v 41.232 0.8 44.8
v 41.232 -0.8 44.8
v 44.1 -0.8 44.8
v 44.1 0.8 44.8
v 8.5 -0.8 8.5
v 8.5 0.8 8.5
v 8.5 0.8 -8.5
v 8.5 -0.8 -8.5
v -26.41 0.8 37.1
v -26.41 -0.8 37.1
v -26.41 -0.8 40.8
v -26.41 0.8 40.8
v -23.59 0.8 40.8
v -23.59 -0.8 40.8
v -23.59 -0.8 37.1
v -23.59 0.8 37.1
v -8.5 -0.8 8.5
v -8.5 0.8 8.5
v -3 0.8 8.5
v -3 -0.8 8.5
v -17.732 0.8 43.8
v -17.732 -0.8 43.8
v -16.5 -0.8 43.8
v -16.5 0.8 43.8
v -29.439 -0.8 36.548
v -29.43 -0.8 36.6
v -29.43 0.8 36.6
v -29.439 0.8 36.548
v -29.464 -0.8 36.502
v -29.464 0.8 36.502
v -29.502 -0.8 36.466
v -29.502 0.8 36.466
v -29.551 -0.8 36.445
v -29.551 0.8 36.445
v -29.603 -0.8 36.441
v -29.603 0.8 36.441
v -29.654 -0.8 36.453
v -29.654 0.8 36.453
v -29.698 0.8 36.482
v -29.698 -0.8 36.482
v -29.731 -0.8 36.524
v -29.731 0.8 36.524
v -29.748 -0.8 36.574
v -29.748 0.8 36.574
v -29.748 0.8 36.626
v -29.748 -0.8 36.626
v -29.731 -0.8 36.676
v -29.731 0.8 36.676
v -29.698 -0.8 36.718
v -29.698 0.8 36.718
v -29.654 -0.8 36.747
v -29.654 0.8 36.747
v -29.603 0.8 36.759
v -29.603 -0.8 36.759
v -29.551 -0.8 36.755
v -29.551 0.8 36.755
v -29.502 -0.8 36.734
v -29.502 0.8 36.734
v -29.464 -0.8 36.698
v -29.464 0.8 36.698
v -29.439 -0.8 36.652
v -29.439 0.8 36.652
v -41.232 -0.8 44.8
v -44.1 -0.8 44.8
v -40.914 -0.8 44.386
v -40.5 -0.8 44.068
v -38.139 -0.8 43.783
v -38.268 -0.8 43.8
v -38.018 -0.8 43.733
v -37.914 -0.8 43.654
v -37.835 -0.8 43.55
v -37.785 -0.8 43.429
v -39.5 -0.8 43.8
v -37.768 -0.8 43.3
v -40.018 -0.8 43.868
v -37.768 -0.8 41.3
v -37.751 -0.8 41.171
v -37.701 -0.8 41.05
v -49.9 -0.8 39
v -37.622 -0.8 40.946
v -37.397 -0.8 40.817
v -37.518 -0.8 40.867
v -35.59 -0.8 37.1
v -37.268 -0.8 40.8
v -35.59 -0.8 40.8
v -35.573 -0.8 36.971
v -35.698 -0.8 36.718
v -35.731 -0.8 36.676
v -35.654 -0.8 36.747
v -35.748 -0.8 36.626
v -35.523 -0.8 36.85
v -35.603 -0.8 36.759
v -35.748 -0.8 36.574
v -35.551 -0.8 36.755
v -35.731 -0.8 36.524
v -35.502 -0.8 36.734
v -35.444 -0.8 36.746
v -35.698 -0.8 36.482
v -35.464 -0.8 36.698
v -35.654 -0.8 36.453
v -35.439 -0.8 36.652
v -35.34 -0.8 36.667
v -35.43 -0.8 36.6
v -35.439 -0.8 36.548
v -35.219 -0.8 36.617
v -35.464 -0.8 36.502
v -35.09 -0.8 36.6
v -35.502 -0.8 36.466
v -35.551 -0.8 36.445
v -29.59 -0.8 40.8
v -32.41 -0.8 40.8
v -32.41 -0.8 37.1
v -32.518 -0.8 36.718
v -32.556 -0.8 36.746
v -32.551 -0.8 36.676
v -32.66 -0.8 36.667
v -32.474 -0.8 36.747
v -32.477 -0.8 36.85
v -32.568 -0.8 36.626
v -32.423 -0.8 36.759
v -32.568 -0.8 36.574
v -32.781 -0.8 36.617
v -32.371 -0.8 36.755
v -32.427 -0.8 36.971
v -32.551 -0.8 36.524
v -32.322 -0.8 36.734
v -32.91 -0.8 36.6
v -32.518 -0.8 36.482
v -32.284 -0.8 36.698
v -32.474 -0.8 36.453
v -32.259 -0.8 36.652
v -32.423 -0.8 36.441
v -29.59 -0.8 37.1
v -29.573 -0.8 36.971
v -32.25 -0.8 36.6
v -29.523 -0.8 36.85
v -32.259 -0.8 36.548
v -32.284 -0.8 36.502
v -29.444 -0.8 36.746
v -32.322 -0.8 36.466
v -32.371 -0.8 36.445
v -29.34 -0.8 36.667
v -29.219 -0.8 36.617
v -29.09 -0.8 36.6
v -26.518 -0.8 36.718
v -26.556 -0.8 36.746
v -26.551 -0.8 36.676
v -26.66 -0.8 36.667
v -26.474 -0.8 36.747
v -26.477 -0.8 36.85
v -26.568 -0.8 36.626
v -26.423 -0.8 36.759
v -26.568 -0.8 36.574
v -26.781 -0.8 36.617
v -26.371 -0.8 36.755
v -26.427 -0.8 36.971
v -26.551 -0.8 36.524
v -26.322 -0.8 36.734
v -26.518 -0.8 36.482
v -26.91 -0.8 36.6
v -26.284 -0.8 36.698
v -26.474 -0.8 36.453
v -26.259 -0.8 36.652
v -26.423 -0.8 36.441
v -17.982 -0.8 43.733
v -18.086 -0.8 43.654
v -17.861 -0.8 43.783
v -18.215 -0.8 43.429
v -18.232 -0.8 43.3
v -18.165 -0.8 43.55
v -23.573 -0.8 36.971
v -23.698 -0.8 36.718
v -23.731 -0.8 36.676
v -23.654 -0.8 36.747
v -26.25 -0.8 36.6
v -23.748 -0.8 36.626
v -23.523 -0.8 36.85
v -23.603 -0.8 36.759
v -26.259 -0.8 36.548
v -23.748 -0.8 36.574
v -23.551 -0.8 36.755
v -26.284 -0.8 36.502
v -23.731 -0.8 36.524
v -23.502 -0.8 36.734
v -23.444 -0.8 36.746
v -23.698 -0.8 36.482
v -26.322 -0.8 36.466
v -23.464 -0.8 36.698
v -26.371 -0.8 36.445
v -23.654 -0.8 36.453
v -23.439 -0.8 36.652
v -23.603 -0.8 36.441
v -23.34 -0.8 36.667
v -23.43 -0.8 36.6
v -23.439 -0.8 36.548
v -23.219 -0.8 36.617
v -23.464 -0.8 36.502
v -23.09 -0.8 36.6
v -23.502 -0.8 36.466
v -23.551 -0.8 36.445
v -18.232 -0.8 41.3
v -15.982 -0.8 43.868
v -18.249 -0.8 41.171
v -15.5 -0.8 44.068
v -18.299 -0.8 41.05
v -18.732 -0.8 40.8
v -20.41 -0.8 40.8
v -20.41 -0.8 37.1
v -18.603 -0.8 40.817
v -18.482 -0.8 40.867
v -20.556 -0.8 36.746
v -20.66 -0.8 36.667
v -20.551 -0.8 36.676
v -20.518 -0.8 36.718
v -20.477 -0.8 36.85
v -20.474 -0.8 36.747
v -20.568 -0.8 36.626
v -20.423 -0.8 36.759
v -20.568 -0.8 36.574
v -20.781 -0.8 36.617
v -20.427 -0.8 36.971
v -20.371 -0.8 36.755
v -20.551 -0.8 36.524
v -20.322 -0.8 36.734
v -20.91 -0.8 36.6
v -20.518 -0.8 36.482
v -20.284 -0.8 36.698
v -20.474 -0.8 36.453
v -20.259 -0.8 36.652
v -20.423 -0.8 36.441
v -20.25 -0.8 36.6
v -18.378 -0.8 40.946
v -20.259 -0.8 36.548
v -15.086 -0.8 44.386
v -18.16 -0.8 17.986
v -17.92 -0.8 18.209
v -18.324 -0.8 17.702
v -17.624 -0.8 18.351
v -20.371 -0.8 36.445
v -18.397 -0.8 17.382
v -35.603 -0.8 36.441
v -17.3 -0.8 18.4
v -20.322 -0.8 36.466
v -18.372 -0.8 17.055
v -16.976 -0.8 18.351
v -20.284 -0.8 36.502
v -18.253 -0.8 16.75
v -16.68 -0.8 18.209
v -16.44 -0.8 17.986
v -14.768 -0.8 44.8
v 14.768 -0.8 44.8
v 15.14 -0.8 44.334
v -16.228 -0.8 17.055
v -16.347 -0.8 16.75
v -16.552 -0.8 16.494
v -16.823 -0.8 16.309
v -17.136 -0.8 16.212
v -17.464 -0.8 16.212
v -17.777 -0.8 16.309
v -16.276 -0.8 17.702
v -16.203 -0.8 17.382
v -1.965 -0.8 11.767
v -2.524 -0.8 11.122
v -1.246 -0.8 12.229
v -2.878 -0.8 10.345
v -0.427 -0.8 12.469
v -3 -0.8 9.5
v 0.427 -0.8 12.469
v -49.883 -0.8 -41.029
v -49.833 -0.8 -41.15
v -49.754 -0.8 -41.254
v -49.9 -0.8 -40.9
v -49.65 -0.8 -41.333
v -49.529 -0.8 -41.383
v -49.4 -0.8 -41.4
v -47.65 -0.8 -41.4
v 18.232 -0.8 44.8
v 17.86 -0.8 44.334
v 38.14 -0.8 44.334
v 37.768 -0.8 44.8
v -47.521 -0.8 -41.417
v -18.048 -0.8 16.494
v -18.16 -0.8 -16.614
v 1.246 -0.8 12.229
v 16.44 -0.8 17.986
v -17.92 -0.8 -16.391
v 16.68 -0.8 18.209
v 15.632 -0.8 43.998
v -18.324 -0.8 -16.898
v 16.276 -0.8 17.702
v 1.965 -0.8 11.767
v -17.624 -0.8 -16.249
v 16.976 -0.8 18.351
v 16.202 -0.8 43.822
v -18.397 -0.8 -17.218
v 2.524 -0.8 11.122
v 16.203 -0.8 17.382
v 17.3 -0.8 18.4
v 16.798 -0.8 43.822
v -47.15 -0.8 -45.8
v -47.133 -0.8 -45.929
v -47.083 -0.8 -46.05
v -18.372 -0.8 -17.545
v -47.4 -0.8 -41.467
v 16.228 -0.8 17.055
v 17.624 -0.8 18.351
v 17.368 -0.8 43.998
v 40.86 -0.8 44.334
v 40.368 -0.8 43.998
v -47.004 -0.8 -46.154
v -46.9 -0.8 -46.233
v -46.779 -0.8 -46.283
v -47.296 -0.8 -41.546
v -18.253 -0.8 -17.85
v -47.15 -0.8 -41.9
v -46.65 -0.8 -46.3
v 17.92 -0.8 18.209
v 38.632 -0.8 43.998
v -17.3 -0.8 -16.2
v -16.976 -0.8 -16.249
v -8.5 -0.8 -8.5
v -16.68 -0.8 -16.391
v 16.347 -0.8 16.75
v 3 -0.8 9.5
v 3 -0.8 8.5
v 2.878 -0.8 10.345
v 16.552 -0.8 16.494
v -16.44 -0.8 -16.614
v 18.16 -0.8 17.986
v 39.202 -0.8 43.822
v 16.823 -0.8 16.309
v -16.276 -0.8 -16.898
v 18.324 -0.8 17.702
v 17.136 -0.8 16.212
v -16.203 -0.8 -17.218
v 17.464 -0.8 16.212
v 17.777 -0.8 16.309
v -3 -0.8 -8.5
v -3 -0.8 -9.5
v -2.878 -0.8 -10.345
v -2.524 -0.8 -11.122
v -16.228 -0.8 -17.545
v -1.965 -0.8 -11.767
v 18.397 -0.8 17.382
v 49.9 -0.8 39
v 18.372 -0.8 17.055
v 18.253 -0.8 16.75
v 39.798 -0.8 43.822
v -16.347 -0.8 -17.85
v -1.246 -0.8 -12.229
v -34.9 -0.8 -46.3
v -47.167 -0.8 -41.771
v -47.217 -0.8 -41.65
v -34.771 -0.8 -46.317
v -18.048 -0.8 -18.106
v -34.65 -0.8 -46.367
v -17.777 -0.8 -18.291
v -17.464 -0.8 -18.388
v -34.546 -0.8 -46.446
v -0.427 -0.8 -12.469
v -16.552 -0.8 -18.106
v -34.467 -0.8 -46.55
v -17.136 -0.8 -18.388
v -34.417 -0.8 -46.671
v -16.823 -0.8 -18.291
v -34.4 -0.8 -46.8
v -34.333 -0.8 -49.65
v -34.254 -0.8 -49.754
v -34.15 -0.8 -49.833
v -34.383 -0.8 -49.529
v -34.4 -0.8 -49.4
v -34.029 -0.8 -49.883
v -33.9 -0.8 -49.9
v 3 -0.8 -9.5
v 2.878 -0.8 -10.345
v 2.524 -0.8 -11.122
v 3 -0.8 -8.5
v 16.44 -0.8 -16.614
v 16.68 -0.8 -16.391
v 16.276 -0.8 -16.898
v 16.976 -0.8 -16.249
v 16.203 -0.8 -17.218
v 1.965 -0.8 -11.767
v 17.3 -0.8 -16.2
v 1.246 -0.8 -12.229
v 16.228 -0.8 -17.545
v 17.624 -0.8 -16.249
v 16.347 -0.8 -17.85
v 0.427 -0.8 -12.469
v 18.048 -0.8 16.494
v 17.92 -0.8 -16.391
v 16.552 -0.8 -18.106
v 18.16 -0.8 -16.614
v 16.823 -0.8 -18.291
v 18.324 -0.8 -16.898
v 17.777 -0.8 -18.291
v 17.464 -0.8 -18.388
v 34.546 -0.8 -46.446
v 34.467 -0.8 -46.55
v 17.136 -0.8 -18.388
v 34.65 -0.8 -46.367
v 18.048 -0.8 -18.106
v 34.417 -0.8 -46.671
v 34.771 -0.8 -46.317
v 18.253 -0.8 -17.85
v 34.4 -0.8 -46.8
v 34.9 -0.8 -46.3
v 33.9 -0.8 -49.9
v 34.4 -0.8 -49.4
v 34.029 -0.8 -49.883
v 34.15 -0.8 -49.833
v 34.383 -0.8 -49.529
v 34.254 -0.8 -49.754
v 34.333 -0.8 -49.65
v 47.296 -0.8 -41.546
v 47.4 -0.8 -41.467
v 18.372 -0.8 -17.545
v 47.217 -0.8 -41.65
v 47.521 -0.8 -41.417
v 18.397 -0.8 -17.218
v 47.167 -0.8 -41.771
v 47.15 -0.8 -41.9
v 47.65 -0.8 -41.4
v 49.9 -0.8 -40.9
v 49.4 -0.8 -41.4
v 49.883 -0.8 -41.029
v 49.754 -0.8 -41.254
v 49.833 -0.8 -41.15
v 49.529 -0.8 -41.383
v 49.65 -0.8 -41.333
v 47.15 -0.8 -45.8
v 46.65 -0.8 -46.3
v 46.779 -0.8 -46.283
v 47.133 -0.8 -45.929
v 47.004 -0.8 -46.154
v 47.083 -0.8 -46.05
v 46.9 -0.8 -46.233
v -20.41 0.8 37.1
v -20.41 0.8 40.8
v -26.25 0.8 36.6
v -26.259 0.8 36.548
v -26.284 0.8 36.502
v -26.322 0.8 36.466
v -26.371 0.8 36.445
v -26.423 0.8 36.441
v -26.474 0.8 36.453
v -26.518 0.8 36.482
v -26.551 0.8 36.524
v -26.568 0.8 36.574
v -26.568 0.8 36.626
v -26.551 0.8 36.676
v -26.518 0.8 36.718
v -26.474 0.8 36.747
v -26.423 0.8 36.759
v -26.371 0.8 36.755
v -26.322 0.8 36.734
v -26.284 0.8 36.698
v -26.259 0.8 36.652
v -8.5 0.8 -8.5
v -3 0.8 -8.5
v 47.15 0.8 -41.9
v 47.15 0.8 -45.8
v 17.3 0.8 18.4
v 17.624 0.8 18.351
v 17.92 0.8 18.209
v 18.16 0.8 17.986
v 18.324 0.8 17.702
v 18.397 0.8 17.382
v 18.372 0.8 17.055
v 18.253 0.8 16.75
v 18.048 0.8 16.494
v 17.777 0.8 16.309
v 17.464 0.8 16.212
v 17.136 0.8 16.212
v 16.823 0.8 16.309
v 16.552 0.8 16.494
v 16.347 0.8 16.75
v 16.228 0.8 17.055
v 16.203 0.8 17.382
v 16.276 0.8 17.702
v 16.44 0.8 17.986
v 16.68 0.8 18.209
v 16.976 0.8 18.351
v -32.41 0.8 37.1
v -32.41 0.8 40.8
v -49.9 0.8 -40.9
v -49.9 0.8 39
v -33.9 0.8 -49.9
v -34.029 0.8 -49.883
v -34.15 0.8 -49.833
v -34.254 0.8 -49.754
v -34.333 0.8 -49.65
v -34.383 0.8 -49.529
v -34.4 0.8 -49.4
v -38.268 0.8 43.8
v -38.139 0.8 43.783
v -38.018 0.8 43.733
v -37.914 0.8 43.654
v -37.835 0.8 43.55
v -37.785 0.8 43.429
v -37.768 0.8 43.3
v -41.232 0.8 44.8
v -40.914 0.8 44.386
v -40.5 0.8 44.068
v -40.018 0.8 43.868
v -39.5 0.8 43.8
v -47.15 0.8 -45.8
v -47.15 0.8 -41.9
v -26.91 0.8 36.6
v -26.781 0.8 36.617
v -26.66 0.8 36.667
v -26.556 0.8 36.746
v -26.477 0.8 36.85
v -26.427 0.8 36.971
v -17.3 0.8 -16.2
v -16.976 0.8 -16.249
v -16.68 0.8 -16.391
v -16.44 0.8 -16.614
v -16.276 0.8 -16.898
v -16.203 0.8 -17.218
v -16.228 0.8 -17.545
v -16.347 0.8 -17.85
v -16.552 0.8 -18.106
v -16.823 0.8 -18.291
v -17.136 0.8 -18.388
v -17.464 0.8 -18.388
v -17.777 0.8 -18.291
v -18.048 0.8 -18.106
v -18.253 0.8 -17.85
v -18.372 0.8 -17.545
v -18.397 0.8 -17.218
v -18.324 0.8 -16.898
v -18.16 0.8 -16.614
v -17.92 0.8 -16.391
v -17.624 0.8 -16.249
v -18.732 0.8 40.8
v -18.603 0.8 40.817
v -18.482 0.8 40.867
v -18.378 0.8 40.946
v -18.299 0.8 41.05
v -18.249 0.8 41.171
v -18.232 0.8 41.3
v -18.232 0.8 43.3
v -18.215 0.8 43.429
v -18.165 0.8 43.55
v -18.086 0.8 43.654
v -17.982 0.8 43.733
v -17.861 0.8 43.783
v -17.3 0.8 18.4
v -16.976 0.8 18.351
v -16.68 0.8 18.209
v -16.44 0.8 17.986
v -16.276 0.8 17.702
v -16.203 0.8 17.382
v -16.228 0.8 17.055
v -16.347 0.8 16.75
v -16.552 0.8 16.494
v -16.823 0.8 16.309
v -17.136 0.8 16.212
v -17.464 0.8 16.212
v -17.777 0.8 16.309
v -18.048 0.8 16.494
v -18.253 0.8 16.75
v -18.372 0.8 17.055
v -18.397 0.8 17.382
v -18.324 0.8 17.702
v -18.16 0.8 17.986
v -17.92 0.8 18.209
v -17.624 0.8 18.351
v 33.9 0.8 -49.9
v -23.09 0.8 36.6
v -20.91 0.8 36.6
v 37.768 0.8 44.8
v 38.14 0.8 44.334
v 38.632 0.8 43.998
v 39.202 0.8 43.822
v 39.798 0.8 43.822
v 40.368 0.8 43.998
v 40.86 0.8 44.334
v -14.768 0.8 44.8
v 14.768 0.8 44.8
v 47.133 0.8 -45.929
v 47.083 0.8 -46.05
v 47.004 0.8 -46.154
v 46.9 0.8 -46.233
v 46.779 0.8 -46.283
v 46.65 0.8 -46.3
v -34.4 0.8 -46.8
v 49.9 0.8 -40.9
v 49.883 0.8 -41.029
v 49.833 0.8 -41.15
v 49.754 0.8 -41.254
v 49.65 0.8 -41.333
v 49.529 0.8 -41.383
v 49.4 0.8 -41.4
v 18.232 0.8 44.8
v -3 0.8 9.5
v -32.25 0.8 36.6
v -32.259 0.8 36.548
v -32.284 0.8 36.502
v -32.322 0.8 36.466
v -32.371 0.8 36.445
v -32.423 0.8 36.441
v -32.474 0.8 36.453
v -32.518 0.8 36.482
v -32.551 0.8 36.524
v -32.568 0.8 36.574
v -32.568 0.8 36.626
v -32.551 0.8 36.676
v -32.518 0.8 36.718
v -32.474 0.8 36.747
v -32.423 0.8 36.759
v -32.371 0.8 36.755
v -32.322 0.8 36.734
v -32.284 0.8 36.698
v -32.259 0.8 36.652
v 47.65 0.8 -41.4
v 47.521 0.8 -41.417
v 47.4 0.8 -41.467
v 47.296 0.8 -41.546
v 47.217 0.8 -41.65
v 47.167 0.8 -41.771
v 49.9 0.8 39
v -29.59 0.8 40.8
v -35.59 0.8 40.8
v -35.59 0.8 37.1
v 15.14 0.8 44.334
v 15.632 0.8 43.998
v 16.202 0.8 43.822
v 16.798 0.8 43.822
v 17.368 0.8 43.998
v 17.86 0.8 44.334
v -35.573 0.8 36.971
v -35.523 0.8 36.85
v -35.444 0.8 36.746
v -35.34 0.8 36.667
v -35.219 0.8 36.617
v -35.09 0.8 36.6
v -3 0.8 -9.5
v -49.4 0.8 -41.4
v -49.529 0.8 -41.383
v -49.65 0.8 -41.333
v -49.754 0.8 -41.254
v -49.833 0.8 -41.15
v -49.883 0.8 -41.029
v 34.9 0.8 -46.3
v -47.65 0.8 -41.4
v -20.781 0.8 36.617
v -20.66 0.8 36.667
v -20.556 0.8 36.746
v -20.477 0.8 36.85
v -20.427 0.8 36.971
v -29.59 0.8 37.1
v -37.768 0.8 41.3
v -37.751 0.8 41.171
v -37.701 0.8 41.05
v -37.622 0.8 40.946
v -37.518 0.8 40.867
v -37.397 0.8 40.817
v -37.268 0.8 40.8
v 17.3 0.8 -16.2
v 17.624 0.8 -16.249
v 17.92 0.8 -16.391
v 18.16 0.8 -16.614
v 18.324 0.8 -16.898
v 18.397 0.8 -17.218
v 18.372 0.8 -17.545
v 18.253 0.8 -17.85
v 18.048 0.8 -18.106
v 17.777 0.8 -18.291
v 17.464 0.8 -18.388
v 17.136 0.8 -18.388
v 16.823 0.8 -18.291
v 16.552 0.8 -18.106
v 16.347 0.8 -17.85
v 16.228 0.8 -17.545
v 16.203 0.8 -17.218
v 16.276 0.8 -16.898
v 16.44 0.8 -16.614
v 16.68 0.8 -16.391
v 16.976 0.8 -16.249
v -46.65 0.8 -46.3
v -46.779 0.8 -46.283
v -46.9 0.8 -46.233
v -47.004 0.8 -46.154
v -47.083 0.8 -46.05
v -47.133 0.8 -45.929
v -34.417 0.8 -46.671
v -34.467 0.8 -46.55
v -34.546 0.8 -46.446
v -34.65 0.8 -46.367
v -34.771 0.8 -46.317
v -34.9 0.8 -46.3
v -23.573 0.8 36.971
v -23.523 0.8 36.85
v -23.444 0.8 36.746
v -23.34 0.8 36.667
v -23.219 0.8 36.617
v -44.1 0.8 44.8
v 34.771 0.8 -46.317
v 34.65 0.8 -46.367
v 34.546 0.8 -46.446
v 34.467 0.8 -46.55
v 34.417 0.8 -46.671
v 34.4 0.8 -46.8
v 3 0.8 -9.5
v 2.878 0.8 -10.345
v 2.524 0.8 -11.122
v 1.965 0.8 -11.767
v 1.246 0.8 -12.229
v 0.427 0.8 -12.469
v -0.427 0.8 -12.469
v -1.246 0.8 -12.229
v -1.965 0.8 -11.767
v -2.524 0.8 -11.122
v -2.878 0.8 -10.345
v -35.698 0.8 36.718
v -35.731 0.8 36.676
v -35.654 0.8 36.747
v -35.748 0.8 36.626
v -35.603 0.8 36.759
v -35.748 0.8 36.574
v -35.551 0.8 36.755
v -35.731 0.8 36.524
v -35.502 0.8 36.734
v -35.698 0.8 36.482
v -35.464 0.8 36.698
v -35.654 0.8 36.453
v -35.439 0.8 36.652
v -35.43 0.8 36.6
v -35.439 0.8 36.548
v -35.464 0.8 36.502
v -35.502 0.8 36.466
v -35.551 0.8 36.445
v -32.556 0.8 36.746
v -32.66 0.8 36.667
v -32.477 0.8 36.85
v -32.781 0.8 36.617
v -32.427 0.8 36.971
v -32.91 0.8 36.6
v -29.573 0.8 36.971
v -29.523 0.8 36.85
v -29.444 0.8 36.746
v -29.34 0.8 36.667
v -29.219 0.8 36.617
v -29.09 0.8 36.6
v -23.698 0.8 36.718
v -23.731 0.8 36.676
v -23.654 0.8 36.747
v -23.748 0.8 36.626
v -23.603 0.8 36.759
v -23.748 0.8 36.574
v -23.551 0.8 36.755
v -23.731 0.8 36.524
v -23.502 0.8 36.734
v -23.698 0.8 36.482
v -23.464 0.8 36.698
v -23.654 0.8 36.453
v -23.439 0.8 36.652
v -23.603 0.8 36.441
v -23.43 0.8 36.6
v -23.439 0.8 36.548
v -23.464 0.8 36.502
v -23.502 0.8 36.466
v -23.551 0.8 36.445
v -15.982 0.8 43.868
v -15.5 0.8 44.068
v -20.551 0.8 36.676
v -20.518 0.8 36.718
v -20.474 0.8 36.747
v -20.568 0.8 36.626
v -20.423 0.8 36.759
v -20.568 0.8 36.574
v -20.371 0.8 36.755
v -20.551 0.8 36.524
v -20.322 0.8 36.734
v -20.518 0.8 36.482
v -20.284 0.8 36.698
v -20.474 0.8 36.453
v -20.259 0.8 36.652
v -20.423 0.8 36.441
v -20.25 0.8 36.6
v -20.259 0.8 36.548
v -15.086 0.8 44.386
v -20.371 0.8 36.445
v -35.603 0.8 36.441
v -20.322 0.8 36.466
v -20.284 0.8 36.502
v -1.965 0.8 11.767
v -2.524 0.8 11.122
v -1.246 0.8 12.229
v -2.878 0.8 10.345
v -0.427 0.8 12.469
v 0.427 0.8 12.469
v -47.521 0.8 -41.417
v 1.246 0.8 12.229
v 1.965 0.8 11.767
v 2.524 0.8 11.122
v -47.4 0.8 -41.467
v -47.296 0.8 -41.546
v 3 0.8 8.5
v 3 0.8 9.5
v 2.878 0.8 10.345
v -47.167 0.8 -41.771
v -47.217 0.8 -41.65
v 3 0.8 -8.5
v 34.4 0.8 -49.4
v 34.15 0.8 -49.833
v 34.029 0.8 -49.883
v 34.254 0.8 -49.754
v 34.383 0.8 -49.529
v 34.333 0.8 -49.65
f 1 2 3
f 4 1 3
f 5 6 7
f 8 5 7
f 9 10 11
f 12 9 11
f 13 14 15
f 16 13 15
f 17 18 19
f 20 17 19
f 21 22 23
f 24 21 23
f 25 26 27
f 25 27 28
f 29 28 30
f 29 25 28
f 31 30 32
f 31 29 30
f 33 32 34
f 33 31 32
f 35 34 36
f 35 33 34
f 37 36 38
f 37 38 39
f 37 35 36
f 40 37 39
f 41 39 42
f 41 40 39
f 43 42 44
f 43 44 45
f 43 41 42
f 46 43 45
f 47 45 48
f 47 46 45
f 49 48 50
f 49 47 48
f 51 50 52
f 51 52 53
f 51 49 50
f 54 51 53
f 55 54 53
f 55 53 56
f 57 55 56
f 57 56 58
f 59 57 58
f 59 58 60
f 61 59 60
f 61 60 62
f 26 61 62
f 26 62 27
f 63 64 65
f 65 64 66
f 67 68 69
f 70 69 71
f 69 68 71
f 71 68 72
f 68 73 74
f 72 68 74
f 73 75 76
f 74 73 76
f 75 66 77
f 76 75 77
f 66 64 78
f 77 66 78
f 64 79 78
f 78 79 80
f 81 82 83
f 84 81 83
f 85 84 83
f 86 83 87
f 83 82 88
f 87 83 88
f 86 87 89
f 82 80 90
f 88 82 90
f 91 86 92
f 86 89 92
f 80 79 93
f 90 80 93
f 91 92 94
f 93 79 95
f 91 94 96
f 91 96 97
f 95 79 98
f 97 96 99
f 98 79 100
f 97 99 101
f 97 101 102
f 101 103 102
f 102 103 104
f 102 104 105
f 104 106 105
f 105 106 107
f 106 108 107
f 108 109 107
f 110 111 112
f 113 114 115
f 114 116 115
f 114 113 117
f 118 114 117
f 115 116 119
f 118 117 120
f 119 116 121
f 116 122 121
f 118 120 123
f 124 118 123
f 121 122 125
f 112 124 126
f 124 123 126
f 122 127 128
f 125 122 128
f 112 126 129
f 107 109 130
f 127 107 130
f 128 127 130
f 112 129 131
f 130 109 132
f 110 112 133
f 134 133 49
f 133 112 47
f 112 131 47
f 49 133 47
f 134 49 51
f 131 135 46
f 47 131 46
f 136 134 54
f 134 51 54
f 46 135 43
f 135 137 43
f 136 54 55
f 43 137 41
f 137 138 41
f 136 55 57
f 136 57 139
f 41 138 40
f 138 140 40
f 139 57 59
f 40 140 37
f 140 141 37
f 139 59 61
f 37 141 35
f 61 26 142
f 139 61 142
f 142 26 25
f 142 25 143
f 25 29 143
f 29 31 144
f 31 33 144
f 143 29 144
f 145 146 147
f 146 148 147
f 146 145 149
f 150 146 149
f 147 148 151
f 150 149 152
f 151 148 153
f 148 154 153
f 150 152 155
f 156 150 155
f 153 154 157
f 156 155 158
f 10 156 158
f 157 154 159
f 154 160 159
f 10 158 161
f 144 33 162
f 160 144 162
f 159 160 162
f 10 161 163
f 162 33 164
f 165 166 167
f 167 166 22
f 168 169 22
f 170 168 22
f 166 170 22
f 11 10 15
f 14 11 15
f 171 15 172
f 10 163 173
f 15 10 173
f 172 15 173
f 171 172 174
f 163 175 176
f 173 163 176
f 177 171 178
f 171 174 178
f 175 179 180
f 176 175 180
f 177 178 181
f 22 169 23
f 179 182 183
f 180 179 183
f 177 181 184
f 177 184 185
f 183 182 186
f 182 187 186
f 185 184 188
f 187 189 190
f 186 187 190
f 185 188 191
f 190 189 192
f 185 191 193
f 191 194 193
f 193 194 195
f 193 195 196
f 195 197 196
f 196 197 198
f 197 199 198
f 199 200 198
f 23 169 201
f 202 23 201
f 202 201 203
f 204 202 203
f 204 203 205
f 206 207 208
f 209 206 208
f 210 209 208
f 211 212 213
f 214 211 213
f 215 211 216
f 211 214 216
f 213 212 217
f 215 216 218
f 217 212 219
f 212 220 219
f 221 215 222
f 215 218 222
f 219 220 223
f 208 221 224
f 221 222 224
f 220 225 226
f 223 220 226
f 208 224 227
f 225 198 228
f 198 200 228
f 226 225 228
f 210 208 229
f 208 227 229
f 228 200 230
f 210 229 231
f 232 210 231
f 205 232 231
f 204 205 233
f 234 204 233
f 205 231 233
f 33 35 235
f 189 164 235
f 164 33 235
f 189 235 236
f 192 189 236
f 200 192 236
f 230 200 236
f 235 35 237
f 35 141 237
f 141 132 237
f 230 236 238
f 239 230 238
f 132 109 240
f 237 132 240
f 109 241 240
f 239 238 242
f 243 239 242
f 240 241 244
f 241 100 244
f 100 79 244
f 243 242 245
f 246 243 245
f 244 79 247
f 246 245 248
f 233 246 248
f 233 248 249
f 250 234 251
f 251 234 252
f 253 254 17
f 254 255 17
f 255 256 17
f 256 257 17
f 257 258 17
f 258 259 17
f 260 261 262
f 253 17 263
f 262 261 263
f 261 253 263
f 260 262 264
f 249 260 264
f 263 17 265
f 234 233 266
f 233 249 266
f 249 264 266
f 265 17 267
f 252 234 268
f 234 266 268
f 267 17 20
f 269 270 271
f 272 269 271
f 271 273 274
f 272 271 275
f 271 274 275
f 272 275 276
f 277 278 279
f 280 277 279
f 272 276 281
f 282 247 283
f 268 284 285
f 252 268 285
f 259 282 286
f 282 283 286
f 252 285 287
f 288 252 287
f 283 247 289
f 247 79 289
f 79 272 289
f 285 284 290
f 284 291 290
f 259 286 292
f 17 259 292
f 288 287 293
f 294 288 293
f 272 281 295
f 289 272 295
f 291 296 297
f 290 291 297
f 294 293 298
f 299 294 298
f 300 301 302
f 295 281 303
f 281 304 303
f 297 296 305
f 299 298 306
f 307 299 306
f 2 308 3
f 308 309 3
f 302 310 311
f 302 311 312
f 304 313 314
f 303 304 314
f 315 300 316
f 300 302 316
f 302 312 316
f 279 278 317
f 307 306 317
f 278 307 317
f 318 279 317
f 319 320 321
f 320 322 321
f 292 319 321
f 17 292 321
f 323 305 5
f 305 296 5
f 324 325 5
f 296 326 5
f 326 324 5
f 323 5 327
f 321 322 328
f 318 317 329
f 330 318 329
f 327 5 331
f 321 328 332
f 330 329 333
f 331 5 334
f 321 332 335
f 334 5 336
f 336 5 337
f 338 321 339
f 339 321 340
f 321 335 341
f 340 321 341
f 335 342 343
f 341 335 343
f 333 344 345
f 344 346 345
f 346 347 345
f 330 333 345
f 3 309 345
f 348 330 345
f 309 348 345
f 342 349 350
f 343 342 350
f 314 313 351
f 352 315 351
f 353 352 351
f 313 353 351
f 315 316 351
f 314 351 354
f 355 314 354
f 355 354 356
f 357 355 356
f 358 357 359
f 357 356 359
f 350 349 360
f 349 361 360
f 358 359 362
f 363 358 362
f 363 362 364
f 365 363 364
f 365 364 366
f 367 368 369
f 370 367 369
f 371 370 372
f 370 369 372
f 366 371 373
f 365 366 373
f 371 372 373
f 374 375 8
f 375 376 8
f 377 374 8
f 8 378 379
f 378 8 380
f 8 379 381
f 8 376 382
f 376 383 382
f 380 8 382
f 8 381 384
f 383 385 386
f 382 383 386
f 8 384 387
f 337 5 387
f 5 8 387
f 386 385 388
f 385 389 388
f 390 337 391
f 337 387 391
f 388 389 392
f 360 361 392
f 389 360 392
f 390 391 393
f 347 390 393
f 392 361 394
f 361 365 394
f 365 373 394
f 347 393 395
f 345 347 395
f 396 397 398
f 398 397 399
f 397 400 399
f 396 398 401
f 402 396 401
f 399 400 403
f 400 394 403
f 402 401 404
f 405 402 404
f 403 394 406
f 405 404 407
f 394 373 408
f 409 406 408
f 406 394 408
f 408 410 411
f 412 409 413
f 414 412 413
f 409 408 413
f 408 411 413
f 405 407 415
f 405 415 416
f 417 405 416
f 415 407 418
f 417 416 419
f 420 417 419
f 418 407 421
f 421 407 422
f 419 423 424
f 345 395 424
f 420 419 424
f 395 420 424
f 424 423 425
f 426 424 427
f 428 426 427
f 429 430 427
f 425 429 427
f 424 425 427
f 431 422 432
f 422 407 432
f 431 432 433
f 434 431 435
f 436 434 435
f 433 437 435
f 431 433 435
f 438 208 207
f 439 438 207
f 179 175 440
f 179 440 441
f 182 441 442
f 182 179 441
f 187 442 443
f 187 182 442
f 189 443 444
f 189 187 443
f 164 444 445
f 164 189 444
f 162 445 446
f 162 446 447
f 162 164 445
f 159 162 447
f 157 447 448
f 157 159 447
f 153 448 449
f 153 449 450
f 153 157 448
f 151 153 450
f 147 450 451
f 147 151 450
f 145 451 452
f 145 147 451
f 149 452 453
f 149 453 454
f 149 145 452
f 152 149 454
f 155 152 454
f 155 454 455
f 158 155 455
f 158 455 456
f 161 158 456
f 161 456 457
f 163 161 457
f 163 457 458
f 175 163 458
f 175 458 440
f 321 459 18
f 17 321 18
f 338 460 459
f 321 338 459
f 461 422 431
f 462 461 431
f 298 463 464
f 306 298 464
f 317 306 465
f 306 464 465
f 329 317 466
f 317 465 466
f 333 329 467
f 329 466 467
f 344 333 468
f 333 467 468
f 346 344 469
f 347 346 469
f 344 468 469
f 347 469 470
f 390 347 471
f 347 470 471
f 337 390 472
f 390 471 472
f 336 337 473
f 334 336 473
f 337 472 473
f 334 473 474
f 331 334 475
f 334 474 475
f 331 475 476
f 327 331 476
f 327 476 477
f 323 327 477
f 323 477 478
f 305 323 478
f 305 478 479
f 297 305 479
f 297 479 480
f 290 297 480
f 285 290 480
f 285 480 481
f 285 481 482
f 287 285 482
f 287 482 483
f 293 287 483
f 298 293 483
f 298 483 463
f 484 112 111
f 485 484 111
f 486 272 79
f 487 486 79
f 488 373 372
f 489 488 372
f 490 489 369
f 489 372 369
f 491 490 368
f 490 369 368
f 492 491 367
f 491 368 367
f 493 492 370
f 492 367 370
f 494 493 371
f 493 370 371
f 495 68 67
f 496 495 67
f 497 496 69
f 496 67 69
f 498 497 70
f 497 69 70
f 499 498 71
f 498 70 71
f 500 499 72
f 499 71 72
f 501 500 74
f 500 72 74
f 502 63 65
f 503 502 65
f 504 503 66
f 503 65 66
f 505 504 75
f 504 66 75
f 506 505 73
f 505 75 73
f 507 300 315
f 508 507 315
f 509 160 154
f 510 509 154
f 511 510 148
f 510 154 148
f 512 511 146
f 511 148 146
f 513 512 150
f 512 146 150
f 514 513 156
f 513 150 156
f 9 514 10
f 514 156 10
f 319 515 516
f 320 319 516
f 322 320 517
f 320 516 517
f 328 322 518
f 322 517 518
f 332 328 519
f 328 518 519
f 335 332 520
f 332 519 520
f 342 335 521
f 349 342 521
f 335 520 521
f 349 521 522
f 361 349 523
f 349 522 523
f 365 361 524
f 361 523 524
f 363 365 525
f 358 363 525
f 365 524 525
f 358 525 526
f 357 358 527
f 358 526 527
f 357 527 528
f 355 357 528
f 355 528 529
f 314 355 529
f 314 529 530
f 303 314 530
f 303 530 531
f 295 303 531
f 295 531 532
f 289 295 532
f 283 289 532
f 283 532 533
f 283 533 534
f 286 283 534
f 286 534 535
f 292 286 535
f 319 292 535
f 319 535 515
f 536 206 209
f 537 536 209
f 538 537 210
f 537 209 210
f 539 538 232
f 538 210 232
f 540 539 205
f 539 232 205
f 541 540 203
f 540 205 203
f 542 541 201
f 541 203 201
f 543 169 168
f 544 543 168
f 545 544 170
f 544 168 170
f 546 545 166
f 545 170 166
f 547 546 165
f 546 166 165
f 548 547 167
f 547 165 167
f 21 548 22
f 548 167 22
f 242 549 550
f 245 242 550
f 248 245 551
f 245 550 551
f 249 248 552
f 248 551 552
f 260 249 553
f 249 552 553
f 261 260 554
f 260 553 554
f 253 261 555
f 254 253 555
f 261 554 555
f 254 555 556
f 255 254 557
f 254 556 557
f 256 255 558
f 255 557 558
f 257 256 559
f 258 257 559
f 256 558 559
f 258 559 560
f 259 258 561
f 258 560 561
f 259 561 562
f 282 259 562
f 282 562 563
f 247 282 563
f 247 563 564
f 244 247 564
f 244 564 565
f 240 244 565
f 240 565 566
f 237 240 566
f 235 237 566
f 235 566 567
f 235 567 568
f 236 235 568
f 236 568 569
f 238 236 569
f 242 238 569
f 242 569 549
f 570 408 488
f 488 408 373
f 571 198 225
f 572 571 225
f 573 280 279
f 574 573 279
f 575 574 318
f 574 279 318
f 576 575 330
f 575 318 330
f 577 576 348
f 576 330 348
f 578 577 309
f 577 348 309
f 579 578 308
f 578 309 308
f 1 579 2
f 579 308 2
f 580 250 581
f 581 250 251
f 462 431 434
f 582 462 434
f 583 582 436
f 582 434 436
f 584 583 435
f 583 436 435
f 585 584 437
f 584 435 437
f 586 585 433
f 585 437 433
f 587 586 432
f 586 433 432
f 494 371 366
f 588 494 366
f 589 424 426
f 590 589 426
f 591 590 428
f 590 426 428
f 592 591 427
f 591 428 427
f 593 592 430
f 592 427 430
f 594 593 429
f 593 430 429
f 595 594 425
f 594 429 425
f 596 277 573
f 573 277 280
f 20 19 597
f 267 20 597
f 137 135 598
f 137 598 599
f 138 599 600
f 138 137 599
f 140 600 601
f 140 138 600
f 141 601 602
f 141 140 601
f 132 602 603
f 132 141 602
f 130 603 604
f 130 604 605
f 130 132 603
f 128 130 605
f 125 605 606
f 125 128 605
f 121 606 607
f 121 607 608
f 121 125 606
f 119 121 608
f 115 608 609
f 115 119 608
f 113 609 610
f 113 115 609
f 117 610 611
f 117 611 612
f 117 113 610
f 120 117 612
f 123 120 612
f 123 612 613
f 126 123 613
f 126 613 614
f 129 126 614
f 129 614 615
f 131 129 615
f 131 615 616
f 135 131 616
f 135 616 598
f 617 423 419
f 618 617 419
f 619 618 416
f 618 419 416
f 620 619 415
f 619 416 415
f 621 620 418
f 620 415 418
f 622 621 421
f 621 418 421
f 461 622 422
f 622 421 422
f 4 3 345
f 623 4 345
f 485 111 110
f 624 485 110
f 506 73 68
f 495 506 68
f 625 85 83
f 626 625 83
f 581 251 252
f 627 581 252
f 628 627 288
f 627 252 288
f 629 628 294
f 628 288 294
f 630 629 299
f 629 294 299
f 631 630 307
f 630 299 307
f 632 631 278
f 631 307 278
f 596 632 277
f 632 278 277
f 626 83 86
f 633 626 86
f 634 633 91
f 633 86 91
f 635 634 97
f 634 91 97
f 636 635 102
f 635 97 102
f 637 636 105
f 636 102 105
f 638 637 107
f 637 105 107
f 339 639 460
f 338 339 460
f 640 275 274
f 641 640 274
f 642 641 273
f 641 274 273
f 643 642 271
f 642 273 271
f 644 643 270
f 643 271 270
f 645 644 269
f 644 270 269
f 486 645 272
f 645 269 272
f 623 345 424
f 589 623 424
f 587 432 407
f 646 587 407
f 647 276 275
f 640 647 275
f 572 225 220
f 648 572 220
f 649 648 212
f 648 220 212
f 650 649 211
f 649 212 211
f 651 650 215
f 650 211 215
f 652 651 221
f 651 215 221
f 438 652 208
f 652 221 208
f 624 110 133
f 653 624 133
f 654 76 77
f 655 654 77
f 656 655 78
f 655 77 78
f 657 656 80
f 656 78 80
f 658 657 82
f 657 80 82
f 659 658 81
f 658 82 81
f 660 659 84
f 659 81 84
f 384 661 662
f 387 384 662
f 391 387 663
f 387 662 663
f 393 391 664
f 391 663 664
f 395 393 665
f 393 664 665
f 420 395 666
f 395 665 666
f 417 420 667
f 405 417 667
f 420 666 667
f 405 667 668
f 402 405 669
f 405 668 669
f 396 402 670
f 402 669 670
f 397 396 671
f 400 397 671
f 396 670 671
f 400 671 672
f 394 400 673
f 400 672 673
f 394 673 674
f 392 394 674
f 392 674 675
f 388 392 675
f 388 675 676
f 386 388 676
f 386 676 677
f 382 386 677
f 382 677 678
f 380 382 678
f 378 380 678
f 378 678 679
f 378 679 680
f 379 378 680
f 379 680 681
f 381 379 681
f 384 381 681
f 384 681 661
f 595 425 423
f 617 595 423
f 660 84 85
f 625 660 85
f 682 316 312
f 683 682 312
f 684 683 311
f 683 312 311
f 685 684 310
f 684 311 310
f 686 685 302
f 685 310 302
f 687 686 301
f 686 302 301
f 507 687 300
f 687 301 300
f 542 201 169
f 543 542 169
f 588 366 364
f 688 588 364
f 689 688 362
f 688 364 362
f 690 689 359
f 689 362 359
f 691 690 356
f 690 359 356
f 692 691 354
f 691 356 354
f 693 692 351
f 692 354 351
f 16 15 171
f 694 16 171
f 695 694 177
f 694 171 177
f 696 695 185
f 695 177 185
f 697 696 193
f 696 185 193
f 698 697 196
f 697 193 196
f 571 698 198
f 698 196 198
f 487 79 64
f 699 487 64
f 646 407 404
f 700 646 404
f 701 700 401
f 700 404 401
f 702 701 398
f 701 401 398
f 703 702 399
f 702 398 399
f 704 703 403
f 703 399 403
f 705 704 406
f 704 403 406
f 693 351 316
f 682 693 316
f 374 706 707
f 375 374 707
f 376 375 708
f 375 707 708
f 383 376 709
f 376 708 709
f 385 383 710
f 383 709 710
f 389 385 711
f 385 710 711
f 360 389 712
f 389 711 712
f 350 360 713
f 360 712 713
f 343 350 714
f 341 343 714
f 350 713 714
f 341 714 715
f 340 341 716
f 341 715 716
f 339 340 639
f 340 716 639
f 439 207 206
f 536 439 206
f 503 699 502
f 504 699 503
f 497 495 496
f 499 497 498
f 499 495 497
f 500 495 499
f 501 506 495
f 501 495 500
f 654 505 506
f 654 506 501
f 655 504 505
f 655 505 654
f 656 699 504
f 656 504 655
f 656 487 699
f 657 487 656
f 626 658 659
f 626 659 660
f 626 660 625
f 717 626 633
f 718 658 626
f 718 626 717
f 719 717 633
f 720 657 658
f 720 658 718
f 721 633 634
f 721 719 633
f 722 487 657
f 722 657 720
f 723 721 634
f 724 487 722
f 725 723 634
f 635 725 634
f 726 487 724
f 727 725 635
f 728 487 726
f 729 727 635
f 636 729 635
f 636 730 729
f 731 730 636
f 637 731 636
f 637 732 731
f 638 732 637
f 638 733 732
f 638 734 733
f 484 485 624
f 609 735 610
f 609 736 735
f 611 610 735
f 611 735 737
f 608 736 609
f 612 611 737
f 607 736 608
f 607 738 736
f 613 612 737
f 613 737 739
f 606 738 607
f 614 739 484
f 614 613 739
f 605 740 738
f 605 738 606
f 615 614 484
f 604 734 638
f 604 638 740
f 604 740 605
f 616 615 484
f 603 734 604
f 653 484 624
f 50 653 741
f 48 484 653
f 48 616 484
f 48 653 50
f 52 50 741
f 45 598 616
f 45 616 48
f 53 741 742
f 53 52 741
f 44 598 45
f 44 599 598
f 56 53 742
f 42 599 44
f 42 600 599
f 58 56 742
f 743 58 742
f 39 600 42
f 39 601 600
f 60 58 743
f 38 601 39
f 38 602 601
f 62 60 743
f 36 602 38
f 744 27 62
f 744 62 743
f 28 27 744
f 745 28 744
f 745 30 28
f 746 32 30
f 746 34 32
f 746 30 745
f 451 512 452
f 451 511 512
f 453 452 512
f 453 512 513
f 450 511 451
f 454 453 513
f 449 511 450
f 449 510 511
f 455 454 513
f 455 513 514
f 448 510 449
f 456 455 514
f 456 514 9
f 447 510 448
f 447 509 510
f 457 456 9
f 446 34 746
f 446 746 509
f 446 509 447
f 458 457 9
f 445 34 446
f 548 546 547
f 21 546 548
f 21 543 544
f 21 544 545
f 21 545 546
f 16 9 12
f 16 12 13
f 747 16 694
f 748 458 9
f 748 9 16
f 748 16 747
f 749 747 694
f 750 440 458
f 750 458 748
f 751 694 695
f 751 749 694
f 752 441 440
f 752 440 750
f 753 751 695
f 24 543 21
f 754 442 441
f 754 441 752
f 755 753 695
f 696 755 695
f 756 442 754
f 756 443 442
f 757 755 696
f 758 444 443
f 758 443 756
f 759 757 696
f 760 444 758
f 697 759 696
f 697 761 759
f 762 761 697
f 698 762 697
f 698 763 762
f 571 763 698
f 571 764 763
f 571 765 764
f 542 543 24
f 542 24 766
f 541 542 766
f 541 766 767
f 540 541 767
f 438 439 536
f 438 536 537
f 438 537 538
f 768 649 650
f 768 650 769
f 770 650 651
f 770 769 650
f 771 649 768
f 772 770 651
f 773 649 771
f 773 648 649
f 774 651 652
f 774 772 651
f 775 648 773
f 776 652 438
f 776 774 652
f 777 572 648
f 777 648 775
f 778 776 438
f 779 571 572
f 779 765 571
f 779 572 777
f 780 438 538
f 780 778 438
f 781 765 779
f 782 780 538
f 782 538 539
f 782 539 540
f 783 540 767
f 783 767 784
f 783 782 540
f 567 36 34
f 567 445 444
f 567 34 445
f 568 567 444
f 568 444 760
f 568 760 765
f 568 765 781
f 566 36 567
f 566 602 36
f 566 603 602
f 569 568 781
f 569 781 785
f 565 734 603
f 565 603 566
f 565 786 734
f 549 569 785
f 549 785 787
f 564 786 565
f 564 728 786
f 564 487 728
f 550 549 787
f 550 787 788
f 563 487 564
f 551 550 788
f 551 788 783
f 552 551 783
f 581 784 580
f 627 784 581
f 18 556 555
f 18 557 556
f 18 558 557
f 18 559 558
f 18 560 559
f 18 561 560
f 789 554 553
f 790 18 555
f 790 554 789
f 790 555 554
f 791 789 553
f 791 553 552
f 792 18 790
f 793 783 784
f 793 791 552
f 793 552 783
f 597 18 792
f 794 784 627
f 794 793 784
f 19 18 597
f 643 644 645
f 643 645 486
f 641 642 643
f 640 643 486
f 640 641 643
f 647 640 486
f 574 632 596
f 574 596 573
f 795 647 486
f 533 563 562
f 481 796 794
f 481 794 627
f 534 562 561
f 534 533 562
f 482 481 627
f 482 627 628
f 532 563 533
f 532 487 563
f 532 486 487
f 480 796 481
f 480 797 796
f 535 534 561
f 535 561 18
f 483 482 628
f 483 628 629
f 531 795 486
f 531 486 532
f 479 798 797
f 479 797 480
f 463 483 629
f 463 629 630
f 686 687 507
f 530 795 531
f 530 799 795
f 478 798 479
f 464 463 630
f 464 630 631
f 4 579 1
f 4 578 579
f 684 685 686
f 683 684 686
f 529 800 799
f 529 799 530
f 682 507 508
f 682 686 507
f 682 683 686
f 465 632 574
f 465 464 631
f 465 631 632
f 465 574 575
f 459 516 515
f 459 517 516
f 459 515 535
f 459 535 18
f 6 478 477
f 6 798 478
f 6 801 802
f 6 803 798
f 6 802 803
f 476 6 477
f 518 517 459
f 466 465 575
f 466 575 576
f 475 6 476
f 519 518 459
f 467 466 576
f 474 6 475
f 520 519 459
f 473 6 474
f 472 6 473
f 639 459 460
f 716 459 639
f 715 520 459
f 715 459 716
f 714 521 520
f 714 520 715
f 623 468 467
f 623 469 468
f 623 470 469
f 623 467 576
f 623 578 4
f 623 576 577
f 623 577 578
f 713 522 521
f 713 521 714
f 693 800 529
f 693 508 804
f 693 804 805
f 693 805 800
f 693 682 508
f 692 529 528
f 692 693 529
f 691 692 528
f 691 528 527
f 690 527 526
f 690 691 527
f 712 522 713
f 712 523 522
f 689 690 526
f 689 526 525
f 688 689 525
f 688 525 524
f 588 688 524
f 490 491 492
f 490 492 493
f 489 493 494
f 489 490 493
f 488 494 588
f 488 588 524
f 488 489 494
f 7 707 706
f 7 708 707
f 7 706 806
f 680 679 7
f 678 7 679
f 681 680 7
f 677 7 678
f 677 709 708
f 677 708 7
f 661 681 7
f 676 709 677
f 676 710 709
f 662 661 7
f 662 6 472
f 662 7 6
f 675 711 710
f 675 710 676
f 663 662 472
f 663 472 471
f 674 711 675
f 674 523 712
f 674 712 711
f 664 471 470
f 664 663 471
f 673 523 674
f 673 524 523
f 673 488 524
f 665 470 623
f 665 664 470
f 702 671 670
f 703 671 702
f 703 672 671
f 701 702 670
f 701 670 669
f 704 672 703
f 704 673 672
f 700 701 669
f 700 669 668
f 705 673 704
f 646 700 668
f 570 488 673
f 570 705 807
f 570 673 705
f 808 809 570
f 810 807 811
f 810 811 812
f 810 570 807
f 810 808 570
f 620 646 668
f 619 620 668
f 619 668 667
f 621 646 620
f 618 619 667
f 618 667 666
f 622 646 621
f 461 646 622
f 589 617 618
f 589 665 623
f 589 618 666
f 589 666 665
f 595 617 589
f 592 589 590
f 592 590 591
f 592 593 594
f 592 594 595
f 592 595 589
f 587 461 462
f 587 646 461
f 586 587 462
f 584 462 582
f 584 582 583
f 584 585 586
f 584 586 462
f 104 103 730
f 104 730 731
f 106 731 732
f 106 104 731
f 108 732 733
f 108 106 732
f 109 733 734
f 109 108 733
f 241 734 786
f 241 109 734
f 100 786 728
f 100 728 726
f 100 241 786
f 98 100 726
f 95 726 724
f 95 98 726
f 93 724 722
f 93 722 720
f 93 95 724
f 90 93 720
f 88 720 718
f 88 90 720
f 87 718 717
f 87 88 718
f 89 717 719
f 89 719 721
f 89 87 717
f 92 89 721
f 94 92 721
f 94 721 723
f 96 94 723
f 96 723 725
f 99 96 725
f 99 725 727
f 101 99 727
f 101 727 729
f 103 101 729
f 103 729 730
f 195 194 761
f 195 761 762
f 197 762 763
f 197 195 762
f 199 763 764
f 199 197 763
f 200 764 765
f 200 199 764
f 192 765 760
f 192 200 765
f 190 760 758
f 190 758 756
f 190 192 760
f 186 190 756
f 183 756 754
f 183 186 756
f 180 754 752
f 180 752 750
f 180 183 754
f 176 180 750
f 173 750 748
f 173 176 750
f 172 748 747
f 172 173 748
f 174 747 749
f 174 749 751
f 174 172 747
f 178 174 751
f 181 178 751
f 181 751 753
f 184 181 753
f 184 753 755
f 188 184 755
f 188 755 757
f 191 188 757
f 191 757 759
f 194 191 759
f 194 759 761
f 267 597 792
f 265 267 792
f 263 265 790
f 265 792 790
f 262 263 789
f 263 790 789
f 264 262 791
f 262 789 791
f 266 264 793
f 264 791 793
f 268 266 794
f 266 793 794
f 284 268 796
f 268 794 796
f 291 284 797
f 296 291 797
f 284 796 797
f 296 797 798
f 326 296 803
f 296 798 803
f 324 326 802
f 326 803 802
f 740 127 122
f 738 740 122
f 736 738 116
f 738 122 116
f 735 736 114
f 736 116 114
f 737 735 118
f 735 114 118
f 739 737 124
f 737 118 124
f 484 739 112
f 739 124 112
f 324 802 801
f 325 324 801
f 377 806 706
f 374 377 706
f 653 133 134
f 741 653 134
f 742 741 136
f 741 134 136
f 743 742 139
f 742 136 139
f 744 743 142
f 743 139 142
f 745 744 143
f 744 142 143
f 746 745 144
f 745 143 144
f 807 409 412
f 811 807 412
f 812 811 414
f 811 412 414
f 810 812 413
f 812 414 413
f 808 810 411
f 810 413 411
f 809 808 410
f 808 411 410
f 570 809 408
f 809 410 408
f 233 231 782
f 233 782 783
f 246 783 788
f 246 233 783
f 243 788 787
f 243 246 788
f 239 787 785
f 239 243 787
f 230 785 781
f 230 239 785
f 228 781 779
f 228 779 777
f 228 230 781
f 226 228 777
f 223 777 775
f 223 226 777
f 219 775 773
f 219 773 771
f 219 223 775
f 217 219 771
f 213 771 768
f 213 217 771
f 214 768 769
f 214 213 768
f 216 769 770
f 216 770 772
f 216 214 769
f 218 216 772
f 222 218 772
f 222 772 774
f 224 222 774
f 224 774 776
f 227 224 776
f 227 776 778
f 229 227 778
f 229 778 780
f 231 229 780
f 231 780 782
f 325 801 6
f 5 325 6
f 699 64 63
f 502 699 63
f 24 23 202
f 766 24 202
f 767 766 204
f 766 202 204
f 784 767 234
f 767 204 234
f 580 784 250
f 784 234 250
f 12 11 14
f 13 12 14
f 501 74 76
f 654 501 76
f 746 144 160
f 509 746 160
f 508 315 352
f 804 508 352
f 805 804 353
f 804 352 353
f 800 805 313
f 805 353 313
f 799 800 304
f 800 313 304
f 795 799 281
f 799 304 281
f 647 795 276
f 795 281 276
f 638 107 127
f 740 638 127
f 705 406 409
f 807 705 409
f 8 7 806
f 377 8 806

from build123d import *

# Parameters (mm, degrees)
GENERICCARDPCBDEFINITION_FILLET3_START   = -0.8
GENERICCARDPCBDEFINITION_FILLET3_OUTLI_R = 0.16
GENERICCARDPCBDEFINITION_FILLET3_DEPTH   = 1.6
SKETCH1_R                                = 1.1
CUT_EXTRUDE1_DEPTH                       = 10


# Read off the part's stored shape, not the designer's step: <GenericCardPCBDefinition>-<Fillet3>
with BuildPart() as part:
    # <GenericCardPCBDefinition>-<Fillet3> outli → <GenericCardPCBDefinition>-<Fillet3> (new body)
    with BuildSketch(Plane(origin=(0, 0, 0), x_dir=(1, 0, 0), z_dir=(0, 1, 0)).offset(GENERICCARDPCBDEFINITION_FILLET3_START)):
        with BuildLine():
            ThreePointArc((-41.232050808, -44.8), (-40.5, -44.067949192), (-39.5, -43.8))
            Line((-39.5, -43.8), (-38.267949192, -43.8))
            ThreePointArc((-38.267949192, -43.8), (-37.914395801, -43.653553391), (-37.767949192, -43.3))
            Line((-37.767949192, -43.3), (-37.767949192, -41.3))
            ThreePointArc((-37.767949192, -41.3), (-37.621502583, -40.946446609), (-37.267949192, -40.8))
            Line((-37.267949192, -40.8), (-35.59, -40.8))
            Line((-35.59, -40.8), (-35.59, -37.1))
            ThreePointArc((-35.59, -37.1), (-35.443553391, -36.746446609), (-35.09, -36.6))
            Line((-35.09, -36.6), (-32.91, -36.6))
            ThreePointArc((-32.91, -36.6), (-32.556446609, -36.746446609), (-32.41, -37.1))
            Line((-32.41, -37.1), (-32.41, -40.8))
            Line((-32.41, -40.8), (-29.59, -40.8))
            Line((-29.59, -40.8), (-29.59, -37.1))
            ThreePointArc((-29.59, -37.1), (-29.443553391, -36.746446609), (-29.09, -36.6))
            Line((-29.09, -36.6), (-26.91, -36.6))
            ThreePointArc((-26.91, -36.6), (-26.556446609, -36.746446609), (-26.41, -37.1))
            Line((-26.41, -37.1), (-26.41, -40.8))
            Line((-26.41, -40.8), (-23.59, -40.8))
            Line((-23.59, -40.8), (-23.59, -37.1))
            ThreePointArc((-23.59, -37.1), (-23.443553391, -36.746446609), (-23.09, -36.6))
            Line((-23.09, -36.6), (-20.91, -36.6))
            ThreePointArc((-20.91, -36.6), (-20.556446609, -36.746446609), (-20.41, -37.1))
            Line((-20.41, -37.1), (-20.41, -40.8))
            Line((-20.41, -40.8), (-18.732050808, -40.8))
            ThreePointArc((-18.732050808, -40.8), (-18.378497417, -40.946446609), (-18.232050808, -41.3))
            Line((-18.232050808, -41.3), (-18.232050808, -43.3))
            ThreePointArc((-18.232050808, -43.3), (-18.085604199, -43.653553391), (-17.732050808, -43.8))
            Line((-17.732050808, -43.8), (-16.5, -43.8))
            ThreePointArc((-16.5, -43.8), (-15.5, -44.067949192), (-14.767949192, -44.8))
            Line((-14.767949192, -44.8), (14.767949192, -44.8))
            ThreePointArc((14.767949192, -44.8), (16.5, -43.8), (18.232050808, -44.8))
            Line((18.232050808, -44.8), (37.767949192, -44.8))
            ThreePointArc((37.767949192, -44.8), (39.5, -43.8), (41.232050808, -44.8))
            Line((41.232050808, -44.8), (44.1, -44.8))
            Line((44.1, -44.8), (49.9, -39))
            Line((49.9, -39), (49.9, 40.9))
            ThreePointArc((49.9, 40.9), (49.753553391, 41.253553391), (49.4, 41.4))
            Line((49.4, 41.4), (47.65, 41.4))
            ThreePointArc((47.65, 41.4), (47.296446609, 41.546446609), (47.15, 41.9))
            Line((47.15, 41.9), (47.15, 45.8))
            ThreePointArc((47.15, 45.8), (47.003553391, 46.153553391), (46.65, 46.3))
            Line((46.65, 46.3), (34.9, 46.3))
            ThreePointArc((34.9, 46.3), (34.546446609, 46.446446609), (34.4, 46.8))
            Line((34.4, 46.8), (34.4, 49.4))
            ThreePointArc((34.4, 49.4), (34.253553391, 49.753553391), (33.9, 49.9))
            Line((33.9, 49.9), (-33.9, 49.9))
            ThreePointArc((-33.9, 49.9), (-34.253553391, 49.753553391), (-34.4, 49.4))
            Line((-34.4, 49.4), (-34.4, 46.8))
            ThreePointArc((-34.4, 46.8), (-34.546446609, 46.446446609), (-34.9, 46.3))
            Line((-34.9, 46.3), (-46.65, 46.3))
            ThreePointArc((-46.65, 46.3), (-47.003553391, 46.153553391), (-47.15, 45.8))
            Line((-47.15, 45.8), (-47.15, 41.9))
            ThreePointArc((-47.15, 41.9), (-47.296446609, 41.546446609), (-47.65, 41.4))
            Line((-47.65, 41.4), (-49.4, 41.4))
            ThreePointArc((-49.4, 41.4), (-49.753553391, 41.253553391), (-49.9, 40.9))
            Line((-49.9, 40.9), (-49.9, -39))
            Line((-49.9, -39), (-44.1, -44.8))
            Line((-44.1, -44.8), (-41.232050808, -44.8))
        make_face()
        with Locations((-35.59, -36.6)):
            Circle(GENERICCARDPCBDEFINITION_FILLET3_OUTLI_R, mode=Mode.SUBTRACT)
        with Locations((-32.41, -36.6)):
            Circle(GENERICCARDPCBDEFINITION_FILLET3_OUTLI_R, mode=Mode.SUBTRACT)
        with Locations((-29.59, -36.6)):
            Circle(GENERICCARDPCBDEFINITION_FILLET3_OUTLI_R, mode=Mode.SUBTRACT)
        with Locations((-26.41, -36.6)):
            Circle(GENERICCARDPCBDEFINITION_FILLET3_OUTLI_R, mode=Mode.SUBTRACT)
        with Locations((-23.59, -36.6)):
            Circle(GENERICCARDPCBDEFINITION_FILLET3_OUTLI_R, mode=Mode.SUBTRACT)
        with Locations((-20.41, -36.6)):
            Circle(GENERICCARDPCBDEFINITION_FILLET3_OUTLI_R, mode=Mode.SUBTRACT)
    extrude(amount=GENERICCARDPCBDEFINITION_FILLET3_DEPTH)

    # Sketch1 → Cut-Extrude1 (cut)
    with BuildSketch(Plane(origin=(0, 0.8, 0), x_dir=(1, 0, 0), z_dir=(0, 1, 0))):
        with Locations(Location((-17.3, -17.3, 0), (0, 0, 270))):
            Circle(SKETCH1_R)
        with Locations(Location((17.3, -17.3, 0), (0, 0, 270))):
            Circle(SKETCH1_R)
        with Locations(Location((-17.3, 17.3, 0), (0, 0, 270))):
            Circle(SKETCH1_R)
        with Locations(Location((17.3, 17.3, 0), (0, 0, 270))):
            Circle(SKETCH1_R)
        with BuildLine():
            Line((8.5, -8.5), (8.5, 8.5))
            Line((8.5, 8.5), (3, 8.5))
            Line((3, 8.5), (3, 9.5))
            ThreePointArc((3, 9.5), (0, 12.5), (-3, 9.5))
            Line((-3, 9.5), (-3, 8.5))
            Line((-3, 8.5), (-8.5, 8.5))
            Line((-8.5, 8.5), (-8.5, -8.5))
            Line((-8.5, -8.5), (-3, -8.5))
            Line((-3, -8.5), (-3, -9.5))
            ThreePointArc((-3, -9.5), (0, -12.5), (3, -9.5))
            Line((3, -9.5), (3, -8.5))
            Line((3, -8.5), (8.5, -8.5))
        make_face()
    extrude(amount=-CUT_EXTRUDE1_DEPTH, mode=Mode.SUBTRACT)


solid = part.part
